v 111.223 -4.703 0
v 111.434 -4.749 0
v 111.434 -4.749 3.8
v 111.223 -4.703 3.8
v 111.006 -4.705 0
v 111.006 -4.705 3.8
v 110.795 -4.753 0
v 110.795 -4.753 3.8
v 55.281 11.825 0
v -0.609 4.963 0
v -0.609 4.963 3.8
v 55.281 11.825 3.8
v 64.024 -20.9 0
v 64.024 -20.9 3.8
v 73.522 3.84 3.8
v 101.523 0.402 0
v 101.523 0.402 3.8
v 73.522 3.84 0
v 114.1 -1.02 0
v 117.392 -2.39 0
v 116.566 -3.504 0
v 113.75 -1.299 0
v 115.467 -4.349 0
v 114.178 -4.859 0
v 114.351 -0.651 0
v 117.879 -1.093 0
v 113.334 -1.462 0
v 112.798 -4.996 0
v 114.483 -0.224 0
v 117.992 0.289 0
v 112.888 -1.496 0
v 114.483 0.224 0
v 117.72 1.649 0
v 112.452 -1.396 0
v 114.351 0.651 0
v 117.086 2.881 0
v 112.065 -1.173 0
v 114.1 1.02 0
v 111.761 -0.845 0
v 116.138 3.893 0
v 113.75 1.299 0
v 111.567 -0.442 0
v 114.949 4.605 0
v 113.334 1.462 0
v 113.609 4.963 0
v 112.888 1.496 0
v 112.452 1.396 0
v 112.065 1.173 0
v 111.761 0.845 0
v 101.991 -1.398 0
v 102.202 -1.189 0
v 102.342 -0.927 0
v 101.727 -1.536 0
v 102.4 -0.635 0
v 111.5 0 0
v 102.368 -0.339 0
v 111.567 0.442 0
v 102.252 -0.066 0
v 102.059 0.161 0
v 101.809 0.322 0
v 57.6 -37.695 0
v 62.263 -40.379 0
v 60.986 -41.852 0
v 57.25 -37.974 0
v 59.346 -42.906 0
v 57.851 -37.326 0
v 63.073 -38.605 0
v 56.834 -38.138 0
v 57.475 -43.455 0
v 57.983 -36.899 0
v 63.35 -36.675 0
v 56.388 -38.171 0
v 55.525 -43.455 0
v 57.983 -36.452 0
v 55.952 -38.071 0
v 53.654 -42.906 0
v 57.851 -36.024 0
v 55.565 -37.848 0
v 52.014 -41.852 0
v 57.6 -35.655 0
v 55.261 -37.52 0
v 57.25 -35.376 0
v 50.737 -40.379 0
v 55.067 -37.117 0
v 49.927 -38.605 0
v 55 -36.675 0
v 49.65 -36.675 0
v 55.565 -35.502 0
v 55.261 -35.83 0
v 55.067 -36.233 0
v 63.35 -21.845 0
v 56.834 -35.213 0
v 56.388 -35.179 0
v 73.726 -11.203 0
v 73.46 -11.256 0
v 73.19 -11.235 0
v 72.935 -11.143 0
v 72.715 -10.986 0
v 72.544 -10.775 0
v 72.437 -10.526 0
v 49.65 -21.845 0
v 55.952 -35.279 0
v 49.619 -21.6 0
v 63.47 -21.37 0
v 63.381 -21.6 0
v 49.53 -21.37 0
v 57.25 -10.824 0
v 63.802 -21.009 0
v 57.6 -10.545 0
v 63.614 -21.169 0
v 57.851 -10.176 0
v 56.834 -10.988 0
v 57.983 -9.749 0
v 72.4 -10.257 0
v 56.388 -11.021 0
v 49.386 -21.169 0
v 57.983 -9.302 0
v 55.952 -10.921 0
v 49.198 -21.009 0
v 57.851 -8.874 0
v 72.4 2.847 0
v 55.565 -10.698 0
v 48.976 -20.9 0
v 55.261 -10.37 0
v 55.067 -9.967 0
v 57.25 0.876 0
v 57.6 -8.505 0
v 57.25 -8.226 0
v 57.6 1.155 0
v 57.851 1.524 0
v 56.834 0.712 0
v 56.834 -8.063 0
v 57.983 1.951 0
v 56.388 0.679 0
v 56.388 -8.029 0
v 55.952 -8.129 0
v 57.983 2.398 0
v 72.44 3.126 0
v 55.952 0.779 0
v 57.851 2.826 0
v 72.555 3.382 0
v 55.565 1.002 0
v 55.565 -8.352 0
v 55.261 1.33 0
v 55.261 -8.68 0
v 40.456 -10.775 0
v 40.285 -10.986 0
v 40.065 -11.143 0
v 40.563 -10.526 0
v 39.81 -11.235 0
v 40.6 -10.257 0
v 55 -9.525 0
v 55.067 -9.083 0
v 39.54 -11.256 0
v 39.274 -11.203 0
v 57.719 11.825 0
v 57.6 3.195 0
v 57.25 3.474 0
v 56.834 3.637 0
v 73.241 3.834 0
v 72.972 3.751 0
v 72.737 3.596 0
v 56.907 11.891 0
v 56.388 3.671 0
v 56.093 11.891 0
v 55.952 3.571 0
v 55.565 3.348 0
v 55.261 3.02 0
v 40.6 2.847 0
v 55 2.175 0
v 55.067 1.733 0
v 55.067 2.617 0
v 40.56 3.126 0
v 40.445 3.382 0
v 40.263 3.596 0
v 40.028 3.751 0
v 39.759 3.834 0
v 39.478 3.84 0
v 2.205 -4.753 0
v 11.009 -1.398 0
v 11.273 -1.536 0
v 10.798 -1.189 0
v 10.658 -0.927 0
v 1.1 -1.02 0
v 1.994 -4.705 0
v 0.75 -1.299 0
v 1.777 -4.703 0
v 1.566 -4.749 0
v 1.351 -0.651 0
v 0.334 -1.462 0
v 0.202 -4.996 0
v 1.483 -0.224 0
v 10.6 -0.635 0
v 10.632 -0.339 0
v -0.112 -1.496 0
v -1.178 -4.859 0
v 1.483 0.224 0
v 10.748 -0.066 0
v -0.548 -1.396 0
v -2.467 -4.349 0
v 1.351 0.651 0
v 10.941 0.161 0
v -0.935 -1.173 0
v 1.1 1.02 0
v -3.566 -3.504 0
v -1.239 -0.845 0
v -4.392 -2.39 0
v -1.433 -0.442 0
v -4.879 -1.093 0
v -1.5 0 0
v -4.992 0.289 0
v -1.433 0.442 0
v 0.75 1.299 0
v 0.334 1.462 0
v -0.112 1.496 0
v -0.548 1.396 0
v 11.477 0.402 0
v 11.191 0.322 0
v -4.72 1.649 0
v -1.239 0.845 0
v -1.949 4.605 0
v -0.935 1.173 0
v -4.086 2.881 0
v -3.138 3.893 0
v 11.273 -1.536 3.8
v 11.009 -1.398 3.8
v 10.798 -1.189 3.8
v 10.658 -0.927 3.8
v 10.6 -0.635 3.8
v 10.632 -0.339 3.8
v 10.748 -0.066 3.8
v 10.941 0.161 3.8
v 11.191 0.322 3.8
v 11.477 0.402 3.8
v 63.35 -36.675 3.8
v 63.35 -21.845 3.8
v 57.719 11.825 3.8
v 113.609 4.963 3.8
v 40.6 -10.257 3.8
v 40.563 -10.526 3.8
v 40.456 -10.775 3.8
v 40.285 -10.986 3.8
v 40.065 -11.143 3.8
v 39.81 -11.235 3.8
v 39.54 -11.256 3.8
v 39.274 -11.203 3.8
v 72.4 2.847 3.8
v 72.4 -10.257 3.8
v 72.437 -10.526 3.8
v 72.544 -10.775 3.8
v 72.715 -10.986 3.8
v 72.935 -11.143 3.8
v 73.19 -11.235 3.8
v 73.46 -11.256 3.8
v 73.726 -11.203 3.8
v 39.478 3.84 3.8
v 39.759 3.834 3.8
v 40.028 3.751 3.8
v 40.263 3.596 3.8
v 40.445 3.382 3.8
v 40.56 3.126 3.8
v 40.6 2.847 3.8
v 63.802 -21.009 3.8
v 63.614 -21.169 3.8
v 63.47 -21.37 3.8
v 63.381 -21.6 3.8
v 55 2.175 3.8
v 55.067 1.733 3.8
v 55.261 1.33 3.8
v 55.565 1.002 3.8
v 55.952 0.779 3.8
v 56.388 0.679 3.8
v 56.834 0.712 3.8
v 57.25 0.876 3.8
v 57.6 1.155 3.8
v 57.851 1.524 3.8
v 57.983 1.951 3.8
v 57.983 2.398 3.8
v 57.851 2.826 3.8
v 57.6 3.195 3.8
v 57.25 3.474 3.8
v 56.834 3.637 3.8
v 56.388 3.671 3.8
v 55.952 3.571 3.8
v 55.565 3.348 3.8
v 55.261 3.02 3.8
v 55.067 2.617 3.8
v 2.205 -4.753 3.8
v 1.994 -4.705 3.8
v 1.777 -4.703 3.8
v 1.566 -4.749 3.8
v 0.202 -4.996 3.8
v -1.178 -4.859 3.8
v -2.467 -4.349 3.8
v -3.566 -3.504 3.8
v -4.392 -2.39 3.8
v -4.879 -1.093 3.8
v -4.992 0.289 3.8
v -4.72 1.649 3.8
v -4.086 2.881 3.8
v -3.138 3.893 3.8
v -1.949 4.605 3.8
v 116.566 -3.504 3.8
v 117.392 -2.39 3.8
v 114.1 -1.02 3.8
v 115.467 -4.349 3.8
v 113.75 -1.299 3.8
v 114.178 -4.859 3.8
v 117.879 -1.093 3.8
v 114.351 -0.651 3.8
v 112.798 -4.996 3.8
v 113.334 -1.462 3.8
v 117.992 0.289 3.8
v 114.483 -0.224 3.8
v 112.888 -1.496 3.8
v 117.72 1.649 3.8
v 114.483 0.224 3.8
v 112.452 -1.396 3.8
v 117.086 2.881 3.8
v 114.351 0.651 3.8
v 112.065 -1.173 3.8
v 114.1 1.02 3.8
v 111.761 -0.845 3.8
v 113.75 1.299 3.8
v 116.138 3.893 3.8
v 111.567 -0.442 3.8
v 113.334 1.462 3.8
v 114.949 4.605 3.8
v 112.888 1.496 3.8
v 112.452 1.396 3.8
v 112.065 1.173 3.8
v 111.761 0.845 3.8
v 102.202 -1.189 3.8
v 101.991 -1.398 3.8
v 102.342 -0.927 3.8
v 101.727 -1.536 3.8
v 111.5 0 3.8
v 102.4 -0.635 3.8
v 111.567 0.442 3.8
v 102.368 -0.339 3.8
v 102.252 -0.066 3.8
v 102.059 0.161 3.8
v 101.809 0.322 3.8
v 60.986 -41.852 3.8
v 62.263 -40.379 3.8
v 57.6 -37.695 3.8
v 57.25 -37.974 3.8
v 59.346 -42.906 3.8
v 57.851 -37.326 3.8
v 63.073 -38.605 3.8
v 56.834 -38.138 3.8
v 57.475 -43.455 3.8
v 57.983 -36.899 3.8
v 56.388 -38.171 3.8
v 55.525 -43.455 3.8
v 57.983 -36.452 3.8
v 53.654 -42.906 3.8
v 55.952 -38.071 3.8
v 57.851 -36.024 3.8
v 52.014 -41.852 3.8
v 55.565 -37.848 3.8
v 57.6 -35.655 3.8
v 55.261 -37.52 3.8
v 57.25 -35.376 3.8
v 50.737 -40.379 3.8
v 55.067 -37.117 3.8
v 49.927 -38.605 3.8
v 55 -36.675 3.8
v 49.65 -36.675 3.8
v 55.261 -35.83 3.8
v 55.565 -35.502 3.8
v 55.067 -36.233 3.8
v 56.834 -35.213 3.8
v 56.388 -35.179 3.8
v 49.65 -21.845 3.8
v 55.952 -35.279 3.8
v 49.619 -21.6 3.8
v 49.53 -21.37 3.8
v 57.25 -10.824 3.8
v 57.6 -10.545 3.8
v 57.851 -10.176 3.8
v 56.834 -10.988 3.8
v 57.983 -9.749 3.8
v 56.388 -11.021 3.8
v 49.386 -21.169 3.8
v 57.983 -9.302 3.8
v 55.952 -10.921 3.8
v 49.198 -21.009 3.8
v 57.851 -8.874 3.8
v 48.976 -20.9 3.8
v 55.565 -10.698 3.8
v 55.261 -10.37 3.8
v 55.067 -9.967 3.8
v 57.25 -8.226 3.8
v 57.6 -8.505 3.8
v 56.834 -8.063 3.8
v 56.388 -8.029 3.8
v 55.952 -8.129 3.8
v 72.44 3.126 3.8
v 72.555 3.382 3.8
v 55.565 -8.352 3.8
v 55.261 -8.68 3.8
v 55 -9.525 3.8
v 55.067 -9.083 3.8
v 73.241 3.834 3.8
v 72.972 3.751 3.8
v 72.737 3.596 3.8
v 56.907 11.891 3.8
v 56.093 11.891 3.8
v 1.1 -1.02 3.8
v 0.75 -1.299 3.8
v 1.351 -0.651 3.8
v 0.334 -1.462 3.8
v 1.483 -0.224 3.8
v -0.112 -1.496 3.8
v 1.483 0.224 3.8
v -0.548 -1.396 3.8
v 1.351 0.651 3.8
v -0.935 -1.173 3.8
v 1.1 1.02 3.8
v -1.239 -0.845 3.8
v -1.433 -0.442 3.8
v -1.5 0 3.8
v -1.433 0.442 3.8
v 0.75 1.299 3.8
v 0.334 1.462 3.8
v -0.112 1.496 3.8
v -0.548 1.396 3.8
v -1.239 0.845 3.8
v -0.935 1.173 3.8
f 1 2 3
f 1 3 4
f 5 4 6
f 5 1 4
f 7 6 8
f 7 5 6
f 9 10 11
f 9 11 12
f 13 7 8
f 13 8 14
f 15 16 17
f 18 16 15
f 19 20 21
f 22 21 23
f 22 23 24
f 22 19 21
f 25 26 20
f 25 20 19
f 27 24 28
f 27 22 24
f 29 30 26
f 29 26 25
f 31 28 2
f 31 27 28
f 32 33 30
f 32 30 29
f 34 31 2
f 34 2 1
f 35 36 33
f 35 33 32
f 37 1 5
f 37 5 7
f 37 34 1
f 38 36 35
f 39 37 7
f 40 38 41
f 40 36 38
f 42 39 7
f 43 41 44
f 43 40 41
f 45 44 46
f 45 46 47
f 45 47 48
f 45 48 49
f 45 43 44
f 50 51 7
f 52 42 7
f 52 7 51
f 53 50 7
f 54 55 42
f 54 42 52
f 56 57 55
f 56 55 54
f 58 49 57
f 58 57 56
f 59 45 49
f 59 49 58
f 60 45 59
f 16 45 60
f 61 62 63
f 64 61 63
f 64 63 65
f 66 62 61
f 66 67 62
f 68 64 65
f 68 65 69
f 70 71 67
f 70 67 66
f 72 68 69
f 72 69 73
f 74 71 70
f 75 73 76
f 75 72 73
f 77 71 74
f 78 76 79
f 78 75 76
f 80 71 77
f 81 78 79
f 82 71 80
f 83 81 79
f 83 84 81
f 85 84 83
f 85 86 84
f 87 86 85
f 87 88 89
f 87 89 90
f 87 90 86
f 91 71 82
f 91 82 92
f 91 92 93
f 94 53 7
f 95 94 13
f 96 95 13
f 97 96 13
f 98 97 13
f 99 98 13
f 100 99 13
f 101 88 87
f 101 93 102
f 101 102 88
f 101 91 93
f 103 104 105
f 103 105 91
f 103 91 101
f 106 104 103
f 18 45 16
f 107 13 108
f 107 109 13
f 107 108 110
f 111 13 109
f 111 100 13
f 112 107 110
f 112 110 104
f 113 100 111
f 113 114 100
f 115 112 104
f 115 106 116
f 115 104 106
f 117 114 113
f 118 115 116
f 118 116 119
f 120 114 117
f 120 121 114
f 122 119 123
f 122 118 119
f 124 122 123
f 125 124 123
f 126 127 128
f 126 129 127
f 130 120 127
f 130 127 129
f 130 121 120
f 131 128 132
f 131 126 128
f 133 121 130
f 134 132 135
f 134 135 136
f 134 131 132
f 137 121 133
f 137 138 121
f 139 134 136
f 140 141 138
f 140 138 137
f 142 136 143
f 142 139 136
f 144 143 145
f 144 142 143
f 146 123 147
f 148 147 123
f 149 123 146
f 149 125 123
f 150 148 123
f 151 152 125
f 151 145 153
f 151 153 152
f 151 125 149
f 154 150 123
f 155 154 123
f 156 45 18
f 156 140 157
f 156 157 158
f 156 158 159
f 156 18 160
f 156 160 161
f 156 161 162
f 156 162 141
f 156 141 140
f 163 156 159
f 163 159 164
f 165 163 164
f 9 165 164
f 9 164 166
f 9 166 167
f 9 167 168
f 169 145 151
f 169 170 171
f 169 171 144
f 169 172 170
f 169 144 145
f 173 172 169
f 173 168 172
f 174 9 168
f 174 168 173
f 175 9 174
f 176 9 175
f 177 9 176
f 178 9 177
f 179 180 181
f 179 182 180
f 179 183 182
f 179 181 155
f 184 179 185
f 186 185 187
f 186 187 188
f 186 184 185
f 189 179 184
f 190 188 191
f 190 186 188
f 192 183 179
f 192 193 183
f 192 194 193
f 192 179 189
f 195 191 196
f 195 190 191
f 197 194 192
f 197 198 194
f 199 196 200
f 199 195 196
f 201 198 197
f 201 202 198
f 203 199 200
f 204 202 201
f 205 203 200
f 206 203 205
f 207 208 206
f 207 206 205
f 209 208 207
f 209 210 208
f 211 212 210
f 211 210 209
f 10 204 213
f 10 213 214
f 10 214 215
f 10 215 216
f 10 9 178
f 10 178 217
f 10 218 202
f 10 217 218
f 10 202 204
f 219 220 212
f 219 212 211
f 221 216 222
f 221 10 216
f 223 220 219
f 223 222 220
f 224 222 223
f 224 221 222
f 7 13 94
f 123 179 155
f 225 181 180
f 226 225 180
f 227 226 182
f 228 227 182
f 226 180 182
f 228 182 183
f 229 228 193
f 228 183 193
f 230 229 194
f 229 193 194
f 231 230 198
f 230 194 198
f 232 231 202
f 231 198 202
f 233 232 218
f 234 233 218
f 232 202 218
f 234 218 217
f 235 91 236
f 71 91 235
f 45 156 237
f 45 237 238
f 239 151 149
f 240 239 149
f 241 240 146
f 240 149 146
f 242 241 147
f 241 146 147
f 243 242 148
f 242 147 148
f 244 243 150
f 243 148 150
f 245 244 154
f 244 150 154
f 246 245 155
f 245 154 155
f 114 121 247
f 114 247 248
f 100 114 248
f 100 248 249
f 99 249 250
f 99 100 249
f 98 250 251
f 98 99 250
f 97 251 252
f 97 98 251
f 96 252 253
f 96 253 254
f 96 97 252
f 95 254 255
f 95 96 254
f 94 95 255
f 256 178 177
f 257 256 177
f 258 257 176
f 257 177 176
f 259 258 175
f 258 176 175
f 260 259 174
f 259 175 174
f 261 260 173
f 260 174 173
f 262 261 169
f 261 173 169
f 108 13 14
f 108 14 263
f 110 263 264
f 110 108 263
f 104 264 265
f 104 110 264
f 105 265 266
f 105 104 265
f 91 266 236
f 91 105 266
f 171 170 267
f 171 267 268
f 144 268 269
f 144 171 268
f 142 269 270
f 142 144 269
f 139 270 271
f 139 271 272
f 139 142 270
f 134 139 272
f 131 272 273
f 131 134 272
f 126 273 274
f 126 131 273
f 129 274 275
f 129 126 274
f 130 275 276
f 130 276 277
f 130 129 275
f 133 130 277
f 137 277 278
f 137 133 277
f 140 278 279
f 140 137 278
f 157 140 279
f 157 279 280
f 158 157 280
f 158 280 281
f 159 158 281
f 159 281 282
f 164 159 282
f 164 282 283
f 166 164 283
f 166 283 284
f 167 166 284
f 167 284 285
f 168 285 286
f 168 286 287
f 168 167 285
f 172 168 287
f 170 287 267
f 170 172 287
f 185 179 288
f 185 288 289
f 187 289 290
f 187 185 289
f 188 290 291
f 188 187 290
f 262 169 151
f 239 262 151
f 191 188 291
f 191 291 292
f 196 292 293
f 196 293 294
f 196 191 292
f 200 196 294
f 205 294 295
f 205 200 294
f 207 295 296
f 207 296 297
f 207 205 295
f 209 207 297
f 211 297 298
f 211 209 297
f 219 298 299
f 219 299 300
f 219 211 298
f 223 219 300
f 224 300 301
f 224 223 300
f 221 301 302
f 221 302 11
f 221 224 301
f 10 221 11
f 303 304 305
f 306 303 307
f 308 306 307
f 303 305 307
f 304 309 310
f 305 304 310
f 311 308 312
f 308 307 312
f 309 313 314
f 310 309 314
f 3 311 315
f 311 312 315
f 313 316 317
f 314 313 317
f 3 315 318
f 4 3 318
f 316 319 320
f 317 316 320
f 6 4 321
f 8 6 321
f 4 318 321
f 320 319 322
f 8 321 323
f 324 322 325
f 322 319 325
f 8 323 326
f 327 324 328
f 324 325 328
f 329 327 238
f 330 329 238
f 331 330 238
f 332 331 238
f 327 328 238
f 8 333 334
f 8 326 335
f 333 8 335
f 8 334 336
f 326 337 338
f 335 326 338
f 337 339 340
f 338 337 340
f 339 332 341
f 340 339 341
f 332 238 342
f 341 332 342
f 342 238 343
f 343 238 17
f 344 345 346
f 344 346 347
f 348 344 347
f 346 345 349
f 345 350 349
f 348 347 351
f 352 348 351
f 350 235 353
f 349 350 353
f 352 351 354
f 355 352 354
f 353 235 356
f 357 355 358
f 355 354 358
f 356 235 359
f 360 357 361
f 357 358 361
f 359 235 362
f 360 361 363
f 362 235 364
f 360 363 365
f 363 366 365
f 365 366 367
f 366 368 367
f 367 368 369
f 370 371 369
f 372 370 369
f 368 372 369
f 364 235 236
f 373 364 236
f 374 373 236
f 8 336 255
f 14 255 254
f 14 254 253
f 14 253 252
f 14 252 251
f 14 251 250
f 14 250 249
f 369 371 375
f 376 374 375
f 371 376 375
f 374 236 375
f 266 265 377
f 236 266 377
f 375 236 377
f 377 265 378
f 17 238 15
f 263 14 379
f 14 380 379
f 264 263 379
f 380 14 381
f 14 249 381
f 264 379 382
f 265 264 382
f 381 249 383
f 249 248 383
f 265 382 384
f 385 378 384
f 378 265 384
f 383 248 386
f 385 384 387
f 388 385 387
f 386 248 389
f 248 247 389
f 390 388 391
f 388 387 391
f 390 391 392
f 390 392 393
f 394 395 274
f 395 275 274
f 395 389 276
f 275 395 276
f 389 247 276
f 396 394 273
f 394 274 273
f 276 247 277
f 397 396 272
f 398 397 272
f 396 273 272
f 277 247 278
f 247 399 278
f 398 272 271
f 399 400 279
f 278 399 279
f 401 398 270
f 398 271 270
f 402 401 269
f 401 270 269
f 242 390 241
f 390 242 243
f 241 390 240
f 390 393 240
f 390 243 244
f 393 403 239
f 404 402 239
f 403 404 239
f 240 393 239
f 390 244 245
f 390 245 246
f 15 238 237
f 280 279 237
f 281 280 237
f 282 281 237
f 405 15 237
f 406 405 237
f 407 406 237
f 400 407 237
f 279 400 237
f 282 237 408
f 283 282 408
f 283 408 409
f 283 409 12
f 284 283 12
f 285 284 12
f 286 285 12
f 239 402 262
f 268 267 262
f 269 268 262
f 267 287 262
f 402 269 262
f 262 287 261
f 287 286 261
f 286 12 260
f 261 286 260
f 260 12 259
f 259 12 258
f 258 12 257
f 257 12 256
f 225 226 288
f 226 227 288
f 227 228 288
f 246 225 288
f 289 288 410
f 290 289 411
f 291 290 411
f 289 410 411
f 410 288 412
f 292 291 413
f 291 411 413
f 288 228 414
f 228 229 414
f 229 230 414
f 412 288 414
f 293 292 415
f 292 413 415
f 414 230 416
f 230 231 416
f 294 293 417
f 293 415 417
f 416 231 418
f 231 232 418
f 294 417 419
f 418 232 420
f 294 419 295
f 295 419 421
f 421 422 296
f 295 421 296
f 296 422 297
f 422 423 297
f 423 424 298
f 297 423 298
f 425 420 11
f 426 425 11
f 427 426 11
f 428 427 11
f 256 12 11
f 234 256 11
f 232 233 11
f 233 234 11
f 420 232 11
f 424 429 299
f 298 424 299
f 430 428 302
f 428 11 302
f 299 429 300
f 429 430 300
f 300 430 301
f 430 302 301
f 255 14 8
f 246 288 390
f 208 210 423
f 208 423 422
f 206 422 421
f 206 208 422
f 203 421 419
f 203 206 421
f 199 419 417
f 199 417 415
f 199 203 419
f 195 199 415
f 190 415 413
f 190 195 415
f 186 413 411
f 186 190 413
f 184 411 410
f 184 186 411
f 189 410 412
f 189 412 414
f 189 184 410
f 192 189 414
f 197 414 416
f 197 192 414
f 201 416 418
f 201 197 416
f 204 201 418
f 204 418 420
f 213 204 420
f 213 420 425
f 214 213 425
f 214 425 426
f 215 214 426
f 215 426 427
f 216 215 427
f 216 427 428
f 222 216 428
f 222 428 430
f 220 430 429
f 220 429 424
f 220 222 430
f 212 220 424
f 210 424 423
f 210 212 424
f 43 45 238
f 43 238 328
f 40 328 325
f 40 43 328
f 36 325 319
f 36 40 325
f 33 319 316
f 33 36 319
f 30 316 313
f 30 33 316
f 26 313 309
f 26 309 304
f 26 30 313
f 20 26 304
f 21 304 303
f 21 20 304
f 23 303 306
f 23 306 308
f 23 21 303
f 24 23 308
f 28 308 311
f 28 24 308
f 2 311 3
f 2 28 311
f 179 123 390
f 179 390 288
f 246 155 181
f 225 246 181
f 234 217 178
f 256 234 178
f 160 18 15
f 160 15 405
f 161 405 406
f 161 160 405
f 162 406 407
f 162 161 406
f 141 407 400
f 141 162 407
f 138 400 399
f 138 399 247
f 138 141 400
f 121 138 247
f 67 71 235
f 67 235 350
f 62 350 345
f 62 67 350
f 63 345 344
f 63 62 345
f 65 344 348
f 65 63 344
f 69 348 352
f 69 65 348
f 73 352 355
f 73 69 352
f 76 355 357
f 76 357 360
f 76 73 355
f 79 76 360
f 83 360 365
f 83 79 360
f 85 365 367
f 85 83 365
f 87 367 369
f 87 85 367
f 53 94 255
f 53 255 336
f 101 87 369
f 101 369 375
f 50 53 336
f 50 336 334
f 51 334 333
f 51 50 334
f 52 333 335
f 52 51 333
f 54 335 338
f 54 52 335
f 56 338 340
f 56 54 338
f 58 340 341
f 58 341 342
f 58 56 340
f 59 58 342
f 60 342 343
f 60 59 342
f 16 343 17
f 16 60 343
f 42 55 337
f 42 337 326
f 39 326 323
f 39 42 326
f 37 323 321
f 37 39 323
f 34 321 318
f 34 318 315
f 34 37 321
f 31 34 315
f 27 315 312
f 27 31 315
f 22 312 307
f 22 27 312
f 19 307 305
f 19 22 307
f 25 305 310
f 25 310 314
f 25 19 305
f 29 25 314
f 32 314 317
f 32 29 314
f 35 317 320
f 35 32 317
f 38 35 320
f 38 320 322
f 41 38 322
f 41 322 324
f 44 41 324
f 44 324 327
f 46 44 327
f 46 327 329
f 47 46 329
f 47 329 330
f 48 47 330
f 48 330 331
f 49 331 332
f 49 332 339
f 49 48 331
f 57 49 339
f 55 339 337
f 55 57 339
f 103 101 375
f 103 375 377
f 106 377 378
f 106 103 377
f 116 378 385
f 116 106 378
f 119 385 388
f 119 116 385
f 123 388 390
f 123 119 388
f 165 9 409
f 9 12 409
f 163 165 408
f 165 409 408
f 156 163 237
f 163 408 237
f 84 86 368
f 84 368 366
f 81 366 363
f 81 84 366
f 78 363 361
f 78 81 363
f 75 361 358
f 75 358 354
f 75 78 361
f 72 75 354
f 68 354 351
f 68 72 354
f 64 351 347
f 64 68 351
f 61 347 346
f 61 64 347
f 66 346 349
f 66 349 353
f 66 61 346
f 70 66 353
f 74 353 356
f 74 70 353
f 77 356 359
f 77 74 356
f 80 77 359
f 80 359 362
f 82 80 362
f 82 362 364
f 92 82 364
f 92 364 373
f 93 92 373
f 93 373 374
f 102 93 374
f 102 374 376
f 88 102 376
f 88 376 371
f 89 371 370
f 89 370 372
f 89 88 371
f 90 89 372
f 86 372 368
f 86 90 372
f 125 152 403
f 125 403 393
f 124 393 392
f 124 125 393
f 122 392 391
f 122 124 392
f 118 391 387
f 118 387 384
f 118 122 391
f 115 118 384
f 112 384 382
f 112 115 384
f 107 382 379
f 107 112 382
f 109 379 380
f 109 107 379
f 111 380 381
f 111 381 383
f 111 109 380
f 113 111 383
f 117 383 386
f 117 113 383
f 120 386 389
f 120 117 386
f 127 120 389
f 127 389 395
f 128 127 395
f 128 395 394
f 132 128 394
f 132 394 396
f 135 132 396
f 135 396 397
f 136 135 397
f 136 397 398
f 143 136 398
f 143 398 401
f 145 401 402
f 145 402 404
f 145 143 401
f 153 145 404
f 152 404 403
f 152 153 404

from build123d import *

# Parameters (mm, degrees)
ESBO_O2_R                = 1.5
RESSALTO_EXTRUS_O1_DEPTH = 3.8
FILETE1_R                = 10


with BuildPart() as part:
    # Esboço2 → Ressalto-extrusão1 (new body)
    with BuildSketch(Plane.XY):
        with BuildLine():
            Line((-0.609346717, 4.962730758), (56.5, 11.974876818))
            Line((56.5, 11.974876818), (113.609346717, 4.962730758))
            ThreePointArc((113.609346717, 4.962730758), (117.879129474, -1.092746803), (111.434372539, -4.748558798))
            ThreePointArc((111.434372539, -4.748558798), (111.114278546, -4.698294837), (110.794916153, -4.753014958))
            Line((110.794916153, -4.753014958), (64.023669106, -20.899867583))
            ThreePointArc((64.023669106, -20.899867583), (63.535650292, -21.264748688), (63.35, -21.845123182))
            Line((63.35, -21.845123182), (63.35, -36.675123182))
            ThreePointArc((63.35, -36.675123182), (56.5, -43.525123182), (49.65, -36.675123182))
            Line((49.65, -36.675123182), (49.65, -21.845123182))
            ThreePointArc((49.65, -21.845123182), (49.464349708, -21.264748688), (48.976330894, -20.899867583))
            Line((48.976330894, -20.899867583), (2.205083847, -4.753014958))
            ThreePointArc((2.205083847, -4.753014958), (1.885721454, -4.698294837), (1.565627461, -4.748558798))
            ThreePointArc((1.565627461, -4.748558798), (-4.879129474, -1.092746803), (-0.609346717, 4.962730758))
        make_face()
        with Locations(Location((0, 0, 0), (0, 0, 180))):
            Circle(ESBO_O2_R, mode=Mode.SUBTRACT)
        with Locations(Location((113, 0, 0), (0, 0, 180))):
            Circle(ESBO_O2_R, mode=Mode.SUBTRACT)
        with Locations(Location((56.5, 2.174876818, 0), (0, 0, 180))):
            Circle(ESBO_O2_R, mode=Mode.SUBTRACT)
        with Locations(Location((56.5, -9.525123182, 0), (0, 0, 180))):
            Circle(ESBO_O2_R, mode=Mode.SUBTRACT)
        with Locations(Location((56.5, -36.675123182, 0), (0, 0, 180))):
            Circle(ESBO_O2_R, mode=Mode.SUBTRACT)
        with BuildLine():
            Line((72.4, 2.847248961), (72.4, -10.257469431))
            ThreePointArc((72.4, -10.257469431), (72.819625506, -11.071819139), (73.726330894, -11.20272503))
            Line((73.726330894, -11.20272503), (101.726975538, -1.536053496))
            ThreePointArc((101.726975538, -1.536053496), (102.395124292, -0.485868251), (101.522513987, 0.401748255))
            Line((101.522513987, 0.401748255), (73.521869343, 3.839795112))
            ThreePointArc((73.521869343, 3.839795112), (72.737379952, 3.596204682), (72.4, 2.847248961))
        make_face(mode=Mode.SUBTRACT)
        with BuildLine():
            Line((11.477486013, 0.401748255), (39.478130657, 3.839795112))
            ThreePointArc((39.478130657, 3.839795112), (40.262620048, 3.596204682), (40.6, 2.847248961))
            Line((40.6, 2.847248961), (40.6, -10.257469431))
            ThreePointArc((40.6, -10.257469431), (40.180374494, -11.071819139), (39.273669106, -11.20272503))
            Line((39.273669106, -11.20272503), (11.273024462, -1.536053496))
            ThreePointArc((11.273024462, -1.536053496), (10.604875708, -0.485868251), (11.477486013, 0.401748255))
        make_face(mode=Mode.SUBTRACT)
    extrude(amount=RESSALTO_EXTRUS_O1_DEPTH)

    # Filete1
    filete1_edges = [part.edges().sort_by_distance(p)[0] for p in [
        (56.5, 11.974876818, 1.9),
    ]]
    fillet(filete1_edges, radius=FILETE1_R)


solid = part.part
